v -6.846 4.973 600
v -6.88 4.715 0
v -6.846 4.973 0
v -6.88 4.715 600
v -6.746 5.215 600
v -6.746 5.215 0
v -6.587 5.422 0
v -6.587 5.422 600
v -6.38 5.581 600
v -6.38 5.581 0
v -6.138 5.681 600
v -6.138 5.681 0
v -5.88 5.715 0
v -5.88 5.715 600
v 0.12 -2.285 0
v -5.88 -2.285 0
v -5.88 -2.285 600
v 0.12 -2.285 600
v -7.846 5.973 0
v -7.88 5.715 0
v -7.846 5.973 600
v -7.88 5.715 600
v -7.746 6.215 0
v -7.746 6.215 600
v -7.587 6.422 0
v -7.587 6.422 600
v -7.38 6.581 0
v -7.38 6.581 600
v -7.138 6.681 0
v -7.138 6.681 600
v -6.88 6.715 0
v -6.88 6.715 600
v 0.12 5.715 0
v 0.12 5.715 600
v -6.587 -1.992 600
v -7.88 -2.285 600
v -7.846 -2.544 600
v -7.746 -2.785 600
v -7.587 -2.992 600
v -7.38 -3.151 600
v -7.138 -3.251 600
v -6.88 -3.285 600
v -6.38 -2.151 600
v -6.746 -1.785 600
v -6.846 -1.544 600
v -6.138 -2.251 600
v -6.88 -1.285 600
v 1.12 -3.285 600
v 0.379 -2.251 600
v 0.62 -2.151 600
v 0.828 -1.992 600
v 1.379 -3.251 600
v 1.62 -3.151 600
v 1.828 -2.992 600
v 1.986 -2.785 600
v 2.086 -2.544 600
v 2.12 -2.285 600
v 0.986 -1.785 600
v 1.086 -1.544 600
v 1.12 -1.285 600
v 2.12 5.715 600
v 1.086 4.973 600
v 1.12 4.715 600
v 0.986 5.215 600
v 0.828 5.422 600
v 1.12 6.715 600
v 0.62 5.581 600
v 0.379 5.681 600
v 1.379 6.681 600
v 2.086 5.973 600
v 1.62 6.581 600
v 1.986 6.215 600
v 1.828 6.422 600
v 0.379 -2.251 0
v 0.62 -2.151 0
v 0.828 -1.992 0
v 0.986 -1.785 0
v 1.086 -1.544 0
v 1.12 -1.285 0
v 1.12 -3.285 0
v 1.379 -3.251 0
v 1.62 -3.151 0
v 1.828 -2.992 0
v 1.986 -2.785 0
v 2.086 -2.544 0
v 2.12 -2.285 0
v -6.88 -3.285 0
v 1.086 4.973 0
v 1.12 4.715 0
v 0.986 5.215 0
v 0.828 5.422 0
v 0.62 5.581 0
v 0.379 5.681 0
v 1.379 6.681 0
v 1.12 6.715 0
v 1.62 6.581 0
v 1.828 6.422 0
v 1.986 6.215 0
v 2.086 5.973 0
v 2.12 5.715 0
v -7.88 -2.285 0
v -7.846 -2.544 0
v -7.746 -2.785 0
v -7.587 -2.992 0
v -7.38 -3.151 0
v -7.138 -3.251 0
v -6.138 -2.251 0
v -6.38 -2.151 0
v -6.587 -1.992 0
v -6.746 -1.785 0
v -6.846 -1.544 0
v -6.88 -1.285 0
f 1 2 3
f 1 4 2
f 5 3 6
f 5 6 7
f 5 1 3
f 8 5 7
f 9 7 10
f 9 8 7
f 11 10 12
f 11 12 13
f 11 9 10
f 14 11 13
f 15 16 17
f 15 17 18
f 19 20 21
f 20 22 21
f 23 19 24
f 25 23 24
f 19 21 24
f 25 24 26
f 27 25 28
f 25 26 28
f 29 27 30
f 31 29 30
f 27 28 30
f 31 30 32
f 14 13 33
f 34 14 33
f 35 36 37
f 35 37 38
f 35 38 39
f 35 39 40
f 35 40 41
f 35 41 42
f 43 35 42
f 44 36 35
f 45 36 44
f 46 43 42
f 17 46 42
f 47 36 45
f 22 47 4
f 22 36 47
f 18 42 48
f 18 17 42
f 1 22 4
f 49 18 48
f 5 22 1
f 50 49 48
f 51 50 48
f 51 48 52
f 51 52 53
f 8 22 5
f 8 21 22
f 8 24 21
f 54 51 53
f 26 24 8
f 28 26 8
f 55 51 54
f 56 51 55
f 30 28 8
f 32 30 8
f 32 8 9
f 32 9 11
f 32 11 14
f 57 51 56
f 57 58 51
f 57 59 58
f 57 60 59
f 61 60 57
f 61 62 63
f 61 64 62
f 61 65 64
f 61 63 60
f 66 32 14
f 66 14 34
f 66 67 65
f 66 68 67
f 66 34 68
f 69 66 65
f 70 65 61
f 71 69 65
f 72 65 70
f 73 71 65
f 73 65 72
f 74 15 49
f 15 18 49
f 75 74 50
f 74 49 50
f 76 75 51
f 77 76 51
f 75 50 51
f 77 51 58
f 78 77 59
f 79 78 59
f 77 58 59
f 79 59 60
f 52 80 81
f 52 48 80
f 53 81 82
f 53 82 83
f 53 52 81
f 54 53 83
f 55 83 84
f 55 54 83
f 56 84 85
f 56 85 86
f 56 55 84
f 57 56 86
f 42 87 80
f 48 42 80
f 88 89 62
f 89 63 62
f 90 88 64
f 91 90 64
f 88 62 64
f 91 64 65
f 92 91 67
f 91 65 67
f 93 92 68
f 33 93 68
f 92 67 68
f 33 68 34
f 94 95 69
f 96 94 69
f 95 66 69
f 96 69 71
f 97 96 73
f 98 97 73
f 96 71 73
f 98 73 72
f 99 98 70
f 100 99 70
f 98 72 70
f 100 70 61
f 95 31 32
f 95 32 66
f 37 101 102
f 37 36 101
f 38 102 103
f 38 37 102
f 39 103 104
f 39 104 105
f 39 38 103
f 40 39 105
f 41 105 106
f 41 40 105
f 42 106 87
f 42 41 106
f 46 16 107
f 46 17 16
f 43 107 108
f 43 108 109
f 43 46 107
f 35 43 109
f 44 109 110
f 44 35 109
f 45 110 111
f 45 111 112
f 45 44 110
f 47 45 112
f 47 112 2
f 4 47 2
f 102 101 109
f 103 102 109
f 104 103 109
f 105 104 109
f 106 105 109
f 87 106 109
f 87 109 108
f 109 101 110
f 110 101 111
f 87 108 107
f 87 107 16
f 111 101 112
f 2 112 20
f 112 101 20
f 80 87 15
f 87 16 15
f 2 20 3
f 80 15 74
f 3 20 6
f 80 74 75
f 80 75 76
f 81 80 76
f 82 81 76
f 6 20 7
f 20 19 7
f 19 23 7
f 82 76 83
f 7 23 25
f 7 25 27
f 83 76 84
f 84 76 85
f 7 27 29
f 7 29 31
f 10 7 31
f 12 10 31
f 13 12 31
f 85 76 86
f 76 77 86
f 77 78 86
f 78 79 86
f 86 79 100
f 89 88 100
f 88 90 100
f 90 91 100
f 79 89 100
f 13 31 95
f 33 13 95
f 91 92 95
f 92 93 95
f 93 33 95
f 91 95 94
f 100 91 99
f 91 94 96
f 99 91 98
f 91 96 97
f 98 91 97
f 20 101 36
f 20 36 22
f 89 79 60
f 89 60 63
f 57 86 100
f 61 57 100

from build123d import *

# Parameters (mm, degrees)
SKETCH1_W           = 10
SKETCH1_H           = 10
SKETCH1_W_2         = 8
SKETCH1_H_2         = 8
BOSS_EXTRUDE1_DEPTH = 600
FILLET1_R           = 1
FILLET2_R           = 1


with BuildPart() as part:
    # Sketch1 → Boss-Extrude1 (new body)
    with BuildSketch(Plane.XY):
        with Locations((-2.879581152, 1.714659686)):
            Rectangle(SKETCH1_W, SKETCH1_H)
        with Locations((-2.879581152, 1.714659686)):
            Rectangle(SKETCH1_W_2, SKETCH1_H_2, mode=Mode.SUBTRACT)
    extrude(amount=BOSS_EXTRUDE1_DEPTH)

    # Fillet1
    fillet1_edges = [part.edges().sort_by_distance(p)[0] for p in [
        (-6.879581152, -2.285340314, 300),
        (2.120418848, -3.285340314, 300),
        (-7.879581152, 6.714659686, 300),
        (2.120418848, 6.714659686, 300),
    ]]
    fillet(fillet1_edges, radius=FILLET1_R)

    # Fillet2
    fillet2_edges = [part.edges().sort_by_distance(p)[0] for p in [
        (1.120418848, -2.285340314, 300),
        (1.120418848, 5.714659686, 300),
        (-6.879581152, 5.714659686, 300),
        (-7.879581152, -3.285340314, 300),
    ]]
    fillet(fillet2_edges, radius=FILLET2_R)


solid = part.part
